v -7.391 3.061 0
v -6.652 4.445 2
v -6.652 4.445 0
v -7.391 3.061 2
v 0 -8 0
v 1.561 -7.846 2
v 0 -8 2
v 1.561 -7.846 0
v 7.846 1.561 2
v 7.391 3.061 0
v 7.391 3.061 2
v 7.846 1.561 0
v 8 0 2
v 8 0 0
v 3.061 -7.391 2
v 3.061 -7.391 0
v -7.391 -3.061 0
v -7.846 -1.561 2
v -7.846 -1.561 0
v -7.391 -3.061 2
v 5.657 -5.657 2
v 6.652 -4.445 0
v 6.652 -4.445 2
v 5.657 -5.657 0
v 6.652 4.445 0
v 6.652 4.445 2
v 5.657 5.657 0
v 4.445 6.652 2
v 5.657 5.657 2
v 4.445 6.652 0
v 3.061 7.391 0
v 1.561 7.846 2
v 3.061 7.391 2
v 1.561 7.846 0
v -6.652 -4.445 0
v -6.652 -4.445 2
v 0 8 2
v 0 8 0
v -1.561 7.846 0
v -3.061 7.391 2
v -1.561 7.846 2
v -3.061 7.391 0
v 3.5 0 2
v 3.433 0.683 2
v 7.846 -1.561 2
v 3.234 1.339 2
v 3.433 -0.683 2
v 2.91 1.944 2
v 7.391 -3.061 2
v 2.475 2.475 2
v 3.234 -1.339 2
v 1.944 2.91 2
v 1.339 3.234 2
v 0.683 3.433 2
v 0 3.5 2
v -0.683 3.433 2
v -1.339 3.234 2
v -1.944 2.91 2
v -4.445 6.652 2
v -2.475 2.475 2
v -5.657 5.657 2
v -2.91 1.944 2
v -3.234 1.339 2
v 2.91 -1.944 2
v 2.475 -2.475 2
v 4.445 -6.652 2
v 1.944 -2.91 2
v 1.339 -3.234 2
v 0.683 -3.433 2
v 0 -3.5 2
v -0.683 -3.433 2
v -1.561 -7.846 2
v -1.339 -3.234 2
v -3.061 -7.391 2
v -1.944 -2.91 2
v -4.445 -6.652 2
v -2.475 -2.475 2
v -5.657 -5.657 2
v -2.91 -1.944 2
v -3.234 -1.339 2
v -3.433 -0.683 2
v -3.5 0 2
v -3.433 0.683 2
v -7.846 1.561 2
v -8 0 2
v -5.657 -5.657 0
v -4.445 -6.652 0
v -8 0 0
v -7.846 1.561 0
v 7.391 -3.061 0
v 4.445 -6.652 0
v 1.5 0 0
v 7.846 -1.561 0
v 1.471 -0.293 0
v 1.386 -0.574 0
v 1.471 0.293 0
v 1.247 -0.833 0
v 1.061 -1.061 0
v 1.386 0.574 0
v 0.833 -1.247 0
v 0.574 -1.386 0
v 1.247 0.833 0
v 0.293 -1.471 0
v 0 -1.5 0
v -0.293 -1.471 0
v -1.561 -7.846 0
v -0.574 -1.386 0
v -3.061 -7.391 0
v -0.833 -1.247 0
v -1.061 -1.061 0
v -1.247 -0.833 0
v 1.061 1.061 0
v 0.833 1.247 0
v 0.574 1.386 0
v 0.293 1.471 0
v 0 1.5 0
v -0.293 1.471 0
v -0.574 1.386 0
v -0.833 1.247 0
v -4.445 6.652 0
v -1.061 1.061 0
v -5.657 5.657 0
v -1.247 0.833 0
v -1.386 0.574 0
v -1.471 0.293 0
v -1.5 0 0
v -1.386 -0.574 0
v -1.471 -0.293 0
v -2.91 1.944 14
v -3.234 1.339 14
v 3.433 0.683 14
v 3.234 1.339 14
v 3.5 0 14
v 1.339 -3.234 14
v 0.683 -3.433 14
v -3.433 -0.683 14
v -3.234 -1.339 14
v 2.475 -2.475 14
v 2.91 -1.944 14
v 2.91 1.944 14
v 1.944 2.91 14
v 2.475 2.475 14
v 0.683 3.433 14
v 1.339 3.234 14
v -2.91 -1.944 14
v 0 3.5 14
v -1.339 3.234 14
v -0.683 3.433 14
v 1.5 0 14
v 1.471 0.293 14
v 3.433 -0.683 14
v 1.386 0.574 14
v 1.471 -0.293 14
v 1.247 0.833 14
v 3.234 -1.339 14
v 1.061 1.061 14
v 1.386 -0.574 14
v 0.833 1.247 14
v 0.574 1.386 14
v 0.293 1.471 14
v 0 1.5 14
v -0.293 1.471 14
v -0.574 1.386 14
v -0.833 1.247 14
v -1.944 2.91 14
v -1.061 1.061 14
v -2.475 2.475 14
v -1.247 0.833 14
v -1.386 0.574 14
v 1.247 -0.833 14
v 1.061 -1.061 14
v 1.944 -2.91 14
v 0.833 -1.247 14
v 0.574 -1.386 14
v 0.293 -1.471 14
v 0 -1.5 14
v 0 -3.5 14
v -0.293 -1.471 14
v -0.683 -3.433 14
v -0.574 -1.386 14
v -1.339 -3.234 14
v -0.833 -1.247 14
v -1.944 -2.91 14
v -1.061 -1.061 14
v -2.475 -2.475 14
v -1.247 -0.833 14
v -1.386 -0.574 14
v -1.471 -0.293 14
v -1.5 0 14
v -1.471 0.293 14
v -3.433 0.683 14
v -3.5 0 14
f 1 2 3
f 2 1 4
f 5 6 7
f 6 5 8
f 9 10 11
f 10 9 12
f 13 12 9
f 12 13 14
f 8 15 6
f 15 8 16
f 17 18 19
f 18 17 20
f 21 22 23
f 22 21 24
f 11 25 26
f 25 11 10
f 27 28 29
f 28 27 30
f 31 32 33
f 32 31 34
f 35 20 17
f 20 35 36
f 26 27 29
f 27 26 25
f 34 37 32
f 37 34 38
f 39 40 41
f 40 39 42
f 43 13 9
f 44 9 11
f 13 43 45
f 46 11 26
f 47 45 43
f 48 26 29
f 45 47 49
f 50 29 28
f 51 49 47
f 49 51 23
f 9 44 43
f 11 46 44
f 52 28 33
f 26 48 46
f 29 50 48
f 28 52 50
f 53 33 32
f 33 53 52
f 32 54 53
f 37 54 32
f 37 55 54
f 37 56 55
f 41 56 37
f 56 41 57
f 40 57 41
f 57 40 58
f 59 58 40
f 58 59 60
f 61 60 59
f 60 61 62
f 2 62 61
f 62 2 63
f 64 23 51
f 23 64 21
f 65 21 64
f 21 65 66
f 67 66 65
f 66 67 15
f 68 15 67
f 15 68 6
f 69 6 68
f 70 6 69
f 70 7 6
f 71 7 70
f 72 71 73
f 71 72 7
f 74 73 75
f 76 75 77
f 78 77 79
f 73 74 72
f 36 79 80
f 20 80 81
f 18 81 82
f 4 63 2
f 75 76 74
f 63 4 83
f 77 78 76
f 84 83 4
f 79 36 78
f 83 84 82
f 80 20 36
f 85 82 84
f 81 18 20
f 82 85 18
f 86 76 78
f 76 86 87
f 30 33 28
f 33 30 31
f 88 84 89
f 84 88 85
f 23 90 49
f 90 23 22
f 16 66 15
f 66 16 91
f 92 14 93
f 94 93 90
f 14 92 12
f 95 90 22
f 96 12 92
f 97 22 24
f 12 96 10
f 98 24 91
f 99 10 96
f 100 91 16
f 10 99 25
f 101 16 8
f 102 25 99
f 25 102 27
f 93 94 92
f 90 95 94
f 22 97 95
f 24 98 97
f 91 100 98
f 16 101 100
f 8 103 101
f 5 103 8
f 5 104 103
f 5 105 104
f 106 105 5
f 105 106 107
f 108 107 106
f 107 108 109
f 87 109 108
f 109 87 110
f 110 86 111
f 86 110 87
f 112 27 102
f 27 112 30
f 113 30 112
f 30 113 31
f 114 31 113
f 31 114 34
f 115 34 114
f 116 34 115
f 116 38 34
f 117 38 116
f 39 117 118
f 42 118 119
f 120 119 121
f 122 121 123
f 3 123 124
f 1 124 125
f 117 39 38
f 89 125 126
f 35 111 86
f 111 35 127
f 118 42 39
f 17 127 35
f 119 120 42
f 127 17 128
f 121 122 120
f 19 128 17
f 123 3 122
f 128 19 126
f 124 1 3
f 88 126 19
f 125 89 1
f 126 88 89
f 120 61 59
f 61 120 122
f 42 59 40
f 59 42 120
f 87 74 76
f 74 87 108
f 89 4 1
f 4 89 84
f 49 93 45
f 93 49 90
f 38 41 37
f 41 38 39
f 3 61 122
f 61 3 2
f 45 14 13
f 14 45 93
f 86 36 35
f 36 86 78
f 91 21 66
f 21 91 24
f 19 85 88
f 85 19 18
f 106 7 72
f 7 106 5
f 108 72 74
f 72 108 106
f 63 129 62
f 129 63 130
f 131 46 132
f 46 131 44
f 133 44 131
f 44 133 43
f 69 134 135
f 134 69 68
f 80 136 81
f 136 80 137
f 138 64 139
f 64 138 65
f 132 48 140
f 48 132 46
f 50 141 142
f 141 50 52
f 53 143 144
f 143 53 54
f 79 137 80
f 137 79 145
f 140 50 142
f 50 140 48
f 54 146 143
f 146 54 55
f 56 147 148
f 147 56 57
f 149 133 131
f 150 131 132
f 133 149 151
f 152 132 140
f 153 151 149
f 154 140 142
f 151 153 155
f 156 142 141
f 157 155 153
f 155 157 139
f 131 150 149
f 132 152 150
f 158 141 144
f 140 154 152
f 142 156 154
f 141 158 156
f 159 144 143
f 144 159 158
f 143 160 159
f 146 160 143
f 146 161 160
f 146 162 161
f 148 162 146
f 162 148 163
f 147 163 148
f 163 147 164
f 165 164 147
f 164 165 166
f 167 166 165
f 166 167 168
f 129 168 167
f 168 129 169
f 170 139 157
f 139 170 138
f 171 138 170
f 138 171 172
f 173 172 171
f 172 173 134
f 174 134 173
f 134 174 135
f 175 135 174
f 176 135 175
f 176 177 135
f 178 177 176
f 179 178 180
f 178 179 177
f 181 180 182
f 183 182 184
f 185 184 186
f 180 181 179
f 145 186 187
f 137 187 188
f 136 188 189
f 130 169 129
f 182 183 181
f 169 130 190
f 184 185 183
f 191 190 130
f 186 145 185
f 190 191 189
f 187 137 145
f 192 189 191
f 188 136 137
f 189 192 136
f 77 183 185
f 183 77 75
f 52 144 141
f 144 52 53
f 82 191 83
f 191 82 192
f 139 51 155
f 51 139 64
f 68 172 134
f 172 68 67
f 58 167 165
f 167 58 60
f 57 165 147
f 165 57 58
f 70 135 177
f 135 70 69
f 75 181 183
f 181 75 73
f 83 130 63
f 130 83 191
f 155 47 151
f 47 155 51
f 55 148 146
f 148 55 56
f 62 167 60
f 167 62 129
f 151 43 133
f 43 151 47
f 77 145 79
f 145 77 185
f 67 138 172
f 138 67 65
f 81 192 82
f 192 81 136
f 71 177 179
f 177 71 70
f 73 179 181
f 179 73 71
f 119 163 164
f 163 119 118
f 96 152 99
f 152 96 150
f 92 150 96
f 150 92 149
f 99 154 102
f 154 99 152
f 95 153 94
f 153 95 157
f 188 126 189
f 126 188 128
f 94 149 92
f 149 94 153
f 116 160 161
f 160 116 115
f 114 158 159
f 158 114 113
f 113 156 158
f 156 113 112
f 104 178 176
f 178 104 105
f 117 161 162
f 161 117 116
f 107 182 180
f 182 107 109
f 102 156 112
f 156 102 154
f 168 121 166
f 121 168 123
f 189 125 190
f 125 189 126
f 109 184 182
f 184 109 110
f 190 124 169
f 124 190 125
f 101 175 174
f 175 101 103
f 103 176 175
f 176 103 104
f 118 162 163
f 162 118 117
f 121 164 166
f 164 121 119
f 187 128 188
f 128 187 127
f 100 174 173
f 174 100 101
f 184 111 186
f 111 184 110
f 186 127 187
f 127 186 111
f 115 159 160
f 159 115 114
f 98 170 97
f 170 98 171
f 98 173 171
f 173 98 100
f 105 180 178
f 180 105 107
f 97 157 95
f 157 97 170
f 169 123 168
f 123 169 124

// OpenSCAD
$fn = 32;

// ----------------------------------------------------------------------
// Micro post: flanged post, 5-20 mm class
// ----------------------------------------------------------------------

// --- parameters (mm) ---
post_d = 7;               // post diameter
post_h = 12;              // post height above the flange
flange_d = 16;            // flange diameter
flange_t = 2;             // flange thickness
bore_d = 3;               // through bore

total_h = post_h + flange_t;  // overall height

difference() {
  union() {
    cylinder(h = flange_t, d = flange_d);
    translate([0, 0, flange_t]) cylinder(h = post_h, d = post_d);
  }
  translate([0, 0, -1]) cylinder(h = total_h + 2, d = bore_d);
}
